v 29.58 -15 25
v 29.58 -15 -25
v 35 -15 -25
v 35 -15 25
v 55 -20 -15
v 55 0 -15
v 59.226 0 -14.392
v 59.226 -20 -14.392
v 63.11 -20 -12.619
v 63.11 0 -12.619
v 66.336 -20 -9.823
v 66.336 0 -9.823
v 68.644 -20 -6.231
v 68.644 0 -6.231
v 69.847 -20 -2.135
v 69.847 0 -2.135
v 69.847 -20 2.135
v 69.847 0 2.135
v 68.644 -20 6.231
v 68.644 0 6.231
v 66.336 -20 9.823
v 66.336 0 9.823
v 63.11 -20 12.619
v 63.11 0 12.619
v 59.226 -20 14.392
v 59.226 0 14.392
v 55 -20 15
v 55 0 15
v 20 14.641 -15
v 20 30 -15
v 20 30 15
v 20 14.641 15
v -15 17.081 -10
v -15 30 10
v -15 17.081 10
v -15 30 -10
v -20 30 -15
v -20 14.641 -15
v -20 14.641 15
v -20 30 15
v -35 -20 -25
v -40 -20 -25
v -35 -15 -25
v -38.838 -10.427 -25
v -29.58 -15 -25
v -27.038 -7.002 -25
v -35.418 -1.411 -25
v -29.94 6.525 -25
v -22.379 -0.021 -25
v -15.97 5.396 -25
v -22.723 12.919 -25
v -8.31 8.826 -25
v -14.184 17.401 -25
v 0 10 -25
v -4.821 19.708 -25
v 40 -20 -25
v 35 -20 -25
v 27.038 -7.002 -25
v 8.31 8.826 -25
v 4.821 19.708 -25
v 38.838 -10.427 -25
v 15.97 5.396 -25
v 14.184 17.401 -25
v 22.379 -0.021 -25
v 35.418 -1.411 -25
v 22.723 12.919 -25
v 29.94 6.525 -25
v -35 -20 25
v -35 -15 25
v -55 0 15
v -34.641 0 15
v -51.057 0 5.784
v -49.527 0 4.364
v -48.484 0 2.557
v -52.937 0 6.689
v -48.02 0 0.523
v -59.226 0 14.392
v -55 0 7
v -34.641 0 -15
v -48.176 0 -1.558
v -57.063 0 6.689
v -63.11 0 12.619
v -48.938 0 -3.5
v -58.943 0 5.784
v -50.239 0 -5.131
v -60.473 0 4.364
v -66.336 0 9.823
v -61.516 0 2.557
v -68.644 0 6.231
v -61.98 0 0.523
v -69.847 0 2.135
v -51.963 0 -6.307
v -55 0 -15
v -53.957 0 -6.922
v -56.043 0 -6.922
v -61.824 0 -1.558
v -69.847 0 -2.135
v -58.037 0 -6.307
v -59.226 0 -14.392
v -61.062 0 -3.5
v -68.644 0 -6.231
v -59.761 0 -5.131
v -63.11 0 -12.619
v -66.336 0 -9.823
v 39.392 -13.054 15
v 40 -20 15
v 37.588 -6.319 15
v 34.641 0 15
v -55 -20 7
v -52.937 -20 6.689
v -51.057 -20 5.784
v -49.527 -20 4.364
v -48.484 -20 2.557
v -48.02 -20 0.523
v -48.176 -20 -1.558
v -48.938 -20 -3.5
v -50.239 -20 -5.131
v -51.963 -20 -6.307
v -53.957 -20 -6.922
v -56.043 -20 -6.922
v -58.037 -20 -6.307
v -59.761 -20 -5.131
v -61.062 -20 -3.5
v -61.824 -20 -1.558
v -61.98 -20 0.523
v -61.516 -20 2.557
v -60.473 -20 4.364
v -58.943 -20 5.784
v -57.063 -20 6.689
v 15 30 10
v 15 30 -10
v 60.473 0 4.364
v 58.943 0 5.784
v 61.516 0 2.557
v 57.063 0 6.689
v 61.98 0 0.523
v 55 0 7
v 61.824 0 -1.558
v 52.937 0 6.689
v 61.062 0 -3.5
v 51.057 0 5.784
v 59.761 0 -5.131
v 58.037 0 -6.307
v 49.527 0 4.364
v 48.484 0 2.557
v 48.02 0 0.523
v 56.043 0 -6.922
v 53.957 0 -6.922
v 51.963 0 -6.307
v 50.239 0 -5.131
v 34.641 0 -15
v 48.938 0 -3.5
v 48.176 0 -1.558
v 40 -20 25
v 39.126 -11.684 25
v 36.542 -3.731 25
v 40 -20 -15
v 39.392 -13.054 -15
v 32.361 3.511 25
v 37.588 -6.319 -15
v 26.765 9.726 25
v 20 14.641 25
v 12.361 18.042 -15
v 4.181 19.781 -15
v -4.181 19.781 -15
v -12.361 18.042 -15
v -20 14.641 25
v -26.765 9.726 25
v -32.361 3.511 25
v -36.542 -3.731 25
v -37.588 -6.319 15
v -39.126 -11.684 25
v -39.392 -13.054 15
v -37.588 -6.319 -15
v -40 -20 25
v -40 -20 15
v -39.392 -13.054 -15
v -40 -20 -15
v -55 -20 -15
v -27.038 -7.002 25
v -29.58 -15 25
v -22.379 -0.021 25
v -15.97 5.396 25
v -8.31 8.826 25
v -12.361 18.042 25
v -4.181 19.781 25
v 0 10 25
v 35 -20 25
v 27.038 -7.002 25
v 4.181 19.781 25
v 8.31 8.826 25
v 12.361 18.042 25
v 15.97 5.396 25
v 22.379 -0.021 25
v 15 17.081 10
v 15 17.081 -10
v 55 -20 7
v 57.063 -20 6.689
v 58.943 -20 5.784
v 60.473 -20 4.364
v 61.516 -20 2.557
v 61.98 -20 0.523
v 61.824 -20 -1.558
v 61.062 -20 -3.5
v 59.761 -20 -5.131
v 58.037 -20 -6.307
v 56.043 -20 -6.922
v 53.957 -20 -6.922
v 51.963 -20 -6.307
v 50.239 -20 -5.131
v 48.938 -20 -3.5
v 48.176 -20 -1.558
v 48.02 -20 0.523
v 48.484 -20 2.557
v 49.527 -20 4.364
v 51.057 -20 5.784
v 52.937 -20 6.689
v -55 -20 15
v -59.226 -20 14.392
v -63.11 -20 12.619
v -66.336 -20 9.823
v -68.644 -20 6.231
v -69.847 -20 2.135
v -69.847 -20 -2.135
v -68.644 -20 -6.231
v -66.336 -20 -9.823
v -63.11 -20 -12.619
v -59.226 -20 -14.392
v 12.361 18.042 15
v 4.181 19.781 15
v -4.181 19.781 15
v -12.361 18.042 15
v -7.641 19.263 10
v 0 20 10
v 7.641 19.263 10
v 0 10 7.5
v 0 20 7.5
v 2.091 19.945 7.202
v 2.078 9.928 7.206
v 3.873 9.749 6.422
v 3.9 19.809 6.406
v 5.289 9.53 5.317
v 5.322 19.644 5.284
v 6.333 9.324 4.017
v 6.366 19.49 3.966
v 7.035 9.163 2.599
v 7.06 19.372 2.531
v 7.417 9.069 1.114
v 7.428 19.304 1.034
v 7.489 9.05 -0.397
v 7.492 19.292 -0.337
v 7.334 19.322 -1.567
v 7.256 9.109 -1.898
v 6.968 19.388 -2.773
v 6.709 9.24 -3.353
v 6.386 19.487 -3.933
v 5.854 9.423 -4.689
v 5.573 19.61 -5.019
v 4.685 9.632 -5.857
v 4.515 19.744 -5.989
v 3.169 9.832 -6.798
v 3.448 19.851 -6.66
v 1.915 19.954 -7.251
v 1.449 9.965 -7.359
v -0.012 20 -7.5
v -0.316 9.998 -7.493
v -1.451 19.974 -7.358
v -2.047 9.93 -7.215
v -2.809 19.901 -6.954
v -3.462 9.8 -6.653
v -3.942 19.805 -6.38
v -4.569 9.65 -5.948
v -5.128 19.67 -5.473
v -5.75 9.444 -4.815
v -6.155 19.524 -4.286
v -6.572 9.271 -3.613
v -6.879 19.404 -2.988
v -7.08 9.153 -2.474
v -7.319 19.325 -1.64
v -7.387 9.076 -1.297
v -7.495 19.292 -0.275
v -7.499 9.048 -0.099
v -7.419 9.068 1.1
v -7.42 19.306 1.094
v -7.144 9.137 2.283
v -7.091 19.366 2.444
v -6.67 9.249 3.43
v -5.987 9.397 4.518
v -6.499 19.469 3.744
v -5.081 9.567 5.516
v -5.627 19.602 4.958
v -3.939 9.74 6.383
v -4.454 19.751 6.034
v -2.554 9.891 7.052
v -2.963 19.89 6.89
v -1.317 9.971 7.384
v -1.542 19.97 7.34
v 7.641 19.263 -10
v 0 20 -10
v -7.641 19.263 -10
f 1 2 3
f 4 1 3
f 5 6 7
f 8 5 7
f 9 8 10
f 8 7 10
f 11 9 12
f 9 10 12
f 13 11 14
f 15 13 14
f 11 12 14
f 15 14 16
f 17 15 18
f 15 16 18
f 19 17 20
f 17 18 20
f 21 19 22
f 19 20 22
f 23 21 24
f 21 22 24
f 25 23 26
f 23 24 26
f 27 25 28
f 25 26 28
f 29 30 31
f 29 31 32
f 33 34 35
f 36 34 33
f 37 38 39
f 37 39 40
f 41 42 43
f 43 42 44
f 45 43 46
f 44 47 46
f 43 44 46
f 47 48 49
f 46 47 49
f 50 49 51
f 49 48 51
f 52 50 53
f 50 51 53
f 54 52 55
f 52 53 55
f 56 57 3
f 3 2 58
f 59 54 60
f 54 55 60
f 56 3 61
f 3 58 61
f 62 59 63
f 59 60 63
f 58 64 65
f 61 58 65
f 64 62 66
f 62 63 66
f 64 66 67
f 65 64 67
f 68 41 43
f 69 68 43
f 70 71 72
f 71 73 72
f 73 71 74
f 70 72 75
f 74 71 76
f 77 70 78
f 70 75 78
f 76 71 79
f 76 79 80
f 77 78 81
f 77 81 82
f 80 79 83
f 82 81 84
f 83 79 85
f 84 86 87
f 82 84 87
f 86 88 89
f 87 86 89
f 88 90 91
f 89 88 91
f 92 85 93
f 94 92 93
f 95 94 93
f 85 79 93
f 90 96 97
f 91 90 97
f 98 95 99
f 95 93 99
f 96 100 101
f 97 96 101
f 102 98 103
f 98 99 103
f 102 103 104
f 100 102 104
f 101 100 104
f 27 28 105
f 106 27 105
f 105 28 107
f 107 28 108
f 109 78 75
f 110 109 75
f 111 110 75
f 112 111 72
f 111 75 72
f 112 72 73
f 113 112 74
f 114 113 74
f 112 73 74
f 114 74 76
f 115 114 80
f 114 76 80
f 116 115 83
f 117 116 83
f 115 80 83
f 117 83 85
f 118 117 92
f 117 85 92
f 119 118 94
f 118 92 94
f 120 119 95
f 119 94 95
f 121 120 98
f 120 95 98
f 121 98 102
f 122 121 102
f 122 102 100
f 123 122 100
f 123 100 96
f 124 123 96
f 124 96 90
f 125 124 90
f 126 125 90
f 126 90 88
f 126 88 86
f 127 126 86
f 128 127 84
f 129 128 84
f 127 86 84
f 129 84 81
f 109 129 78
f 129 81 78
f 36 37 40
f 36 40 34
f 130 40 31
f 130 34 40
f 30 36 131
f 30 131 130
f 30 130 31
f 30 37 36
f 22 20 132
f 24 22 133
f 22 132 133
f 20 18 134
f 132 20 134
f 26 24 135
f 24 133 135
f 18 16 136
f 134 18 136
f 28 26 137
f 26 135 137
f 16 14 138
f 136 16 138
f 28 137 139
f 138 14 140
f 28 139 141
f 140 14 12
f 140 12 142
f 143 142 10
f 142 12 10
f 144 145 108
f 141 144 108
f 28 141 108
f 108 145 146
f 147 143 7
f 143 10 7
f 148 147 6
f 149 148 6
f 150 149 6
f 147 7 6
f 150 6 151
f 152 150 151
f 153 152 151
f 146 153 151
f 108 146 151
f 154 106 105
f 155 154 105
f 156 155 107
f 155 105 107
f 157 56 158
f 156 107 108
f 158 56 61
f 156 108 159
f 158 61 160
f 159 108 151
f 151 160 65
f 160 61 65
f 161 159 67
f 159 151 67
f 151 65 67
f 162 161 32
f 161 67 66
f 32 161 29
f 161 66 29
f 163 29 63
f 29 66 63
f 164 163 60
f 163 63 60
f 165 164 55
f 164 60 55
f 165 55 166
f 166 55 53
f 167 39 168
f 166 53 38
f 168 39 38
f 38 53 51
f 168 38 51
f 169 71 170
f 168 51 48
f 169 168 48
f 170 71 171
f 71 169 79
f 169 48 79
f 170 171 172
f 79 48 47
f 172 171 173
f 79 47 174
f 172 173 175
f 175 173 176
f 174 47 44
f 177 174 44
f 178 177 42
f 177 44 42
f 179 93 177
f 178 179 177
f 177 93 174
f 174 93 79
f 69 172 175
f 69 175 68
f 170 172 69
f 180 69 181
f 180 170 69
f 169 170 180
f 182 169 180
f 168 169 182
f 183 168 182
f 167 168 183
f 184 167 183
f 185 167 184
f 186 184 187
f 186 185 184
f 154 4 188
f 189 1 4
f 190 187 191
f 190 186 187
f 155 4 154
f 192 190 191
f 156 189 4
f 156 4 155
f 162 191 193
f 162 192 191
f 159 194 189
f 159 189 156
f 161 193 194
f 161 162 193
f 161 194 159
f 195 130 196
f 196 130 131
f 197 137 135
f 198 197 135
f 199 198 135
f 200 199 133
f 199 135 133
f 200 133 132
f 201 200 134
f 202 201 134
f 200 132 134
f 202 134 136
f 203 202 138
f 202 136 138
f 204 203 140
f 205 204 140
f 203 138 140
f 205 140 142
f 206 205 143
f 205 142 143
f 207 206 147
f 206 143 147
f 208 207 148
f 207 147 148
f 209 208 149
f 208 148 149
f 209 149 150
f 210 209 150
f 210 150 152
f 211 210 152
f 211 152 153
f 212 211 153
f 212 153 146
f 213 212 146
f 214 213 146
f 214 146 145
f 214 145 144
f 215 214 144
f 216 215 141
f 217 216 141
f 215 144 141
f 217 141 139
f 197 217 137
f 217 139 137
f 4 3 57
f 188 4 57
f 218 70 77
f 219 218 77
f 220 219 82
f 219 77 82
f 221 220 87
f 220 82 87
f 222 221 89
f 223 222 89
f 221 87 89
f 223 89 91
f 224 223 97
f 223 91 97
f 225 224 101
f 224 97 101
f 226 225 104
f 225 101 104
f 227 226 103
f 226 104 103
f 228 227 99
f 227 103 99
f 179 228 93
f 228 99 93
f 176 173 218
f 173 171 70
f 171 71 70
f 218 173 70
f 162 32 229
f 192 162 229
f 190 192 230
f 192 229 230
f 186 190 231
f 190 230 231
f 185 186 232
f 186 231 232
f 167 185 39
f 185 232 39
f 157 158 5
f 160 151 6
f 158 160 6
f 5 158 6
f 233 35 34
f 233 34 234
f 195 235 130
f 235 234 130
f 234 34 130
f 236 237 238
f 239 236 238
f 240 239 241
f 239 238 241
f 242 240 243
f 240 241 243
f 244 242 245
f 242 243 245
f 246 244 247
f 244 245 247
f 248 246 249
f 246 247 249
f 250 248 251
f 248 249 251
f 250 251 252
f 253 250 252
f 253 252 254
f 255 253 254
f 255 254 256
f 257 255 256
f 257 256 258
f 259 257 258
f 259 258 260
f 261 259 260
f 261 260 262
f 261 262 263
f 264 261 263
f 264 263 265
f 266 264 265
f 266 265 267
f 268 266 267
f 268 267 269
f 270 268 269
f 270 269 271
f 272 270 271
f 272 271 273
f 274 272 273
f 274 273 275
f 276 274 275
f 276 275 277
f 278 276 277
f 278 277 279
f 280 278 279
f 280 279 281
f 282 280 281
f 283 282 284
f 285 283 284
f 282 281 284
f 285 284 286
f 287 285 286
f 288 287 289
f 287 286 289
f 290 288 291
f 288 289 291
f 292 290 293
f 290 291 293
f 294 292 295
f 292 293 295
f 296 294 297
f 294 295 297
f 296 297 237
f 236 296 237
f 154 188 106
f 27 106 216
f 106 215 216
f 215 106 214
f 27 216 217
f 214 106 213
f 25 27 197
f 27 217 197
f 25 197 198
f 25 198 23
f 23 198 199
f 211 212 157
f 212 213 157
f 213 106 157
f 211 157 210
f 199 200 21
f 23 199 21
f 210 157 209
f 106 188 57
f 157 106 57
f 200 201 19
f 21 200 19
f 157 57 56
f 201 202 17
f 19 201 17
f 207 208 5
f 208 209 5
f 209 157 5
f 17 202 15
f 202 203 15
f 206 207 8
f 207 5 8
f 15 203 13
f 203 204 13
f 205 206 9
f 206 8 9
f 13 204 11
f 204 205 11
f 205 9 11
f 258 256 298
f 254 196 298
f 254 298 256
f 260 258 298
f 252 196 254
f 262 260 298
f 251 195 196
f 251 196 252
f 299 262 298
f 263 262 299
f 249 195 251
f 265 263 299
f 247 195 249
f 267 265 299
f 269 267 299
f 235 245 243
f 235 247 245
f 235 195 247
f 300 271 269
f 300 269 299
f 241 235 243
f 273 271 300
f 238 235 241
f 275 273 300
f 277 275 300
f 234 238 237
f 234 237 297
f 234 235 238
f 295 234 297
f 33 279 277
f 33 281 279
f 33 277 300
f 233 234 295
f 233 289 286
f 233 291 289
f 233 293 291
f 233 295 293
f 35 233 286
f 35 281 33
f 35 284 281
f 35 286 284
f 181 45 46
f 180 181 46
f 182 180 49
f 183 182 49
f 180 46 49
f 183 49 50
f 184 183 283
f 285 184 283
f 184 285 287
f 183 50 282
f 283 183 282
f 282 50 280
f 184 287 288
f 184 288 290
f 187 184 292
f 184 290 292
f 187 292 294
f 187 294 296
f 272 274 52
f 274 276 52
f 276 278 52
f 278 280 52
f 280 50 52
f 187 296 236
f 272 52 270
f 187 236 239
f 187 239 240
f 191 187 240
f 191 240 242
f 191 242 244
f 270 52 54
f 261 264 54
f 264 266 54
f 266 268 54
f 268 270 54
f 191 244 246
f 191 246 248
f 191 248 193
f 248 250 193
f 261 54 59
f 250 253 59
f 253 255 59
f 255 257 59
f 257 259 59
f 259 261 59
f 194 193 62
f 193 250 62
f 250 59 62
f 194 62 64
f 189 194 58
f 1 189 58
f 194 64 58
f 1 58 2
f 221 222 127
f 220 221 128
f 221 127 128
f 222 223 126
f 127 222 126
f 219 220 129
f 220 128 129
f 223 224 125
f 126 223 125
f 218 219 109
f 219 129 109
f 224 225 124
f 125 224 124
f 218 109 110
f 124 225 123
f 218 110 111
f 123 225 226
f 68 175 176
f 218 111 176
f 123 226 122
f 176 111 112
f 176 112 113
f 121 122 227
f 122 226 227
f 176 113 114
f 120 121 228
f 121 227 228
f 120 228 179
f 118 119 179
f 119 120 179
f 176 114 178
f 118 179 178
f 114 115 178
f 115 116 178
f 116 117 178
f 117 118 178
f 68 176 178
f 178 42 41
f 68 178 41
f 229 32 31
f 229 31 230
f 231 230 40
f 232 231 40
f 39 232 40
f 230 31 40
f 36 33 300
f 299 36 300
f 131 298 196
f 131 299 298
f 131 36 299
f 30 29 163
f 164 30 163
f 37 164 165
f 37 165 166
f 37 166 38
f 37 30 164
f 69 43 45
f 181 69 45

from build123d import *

# Parameters (mm, degrees)
SKETCH1_R                = 7
BOSS_EXTRUDE1_DEPTH      = 20
BOSS_EXTRUDE2_DEPTH      = 10
BOSS_EXTRUDE2_DEPTH_BACK = 40
CUT_EXTRUDE1_START       = -72
CUT_EXTRUDE1_DEPTH       = 72
BOSS_EXTRUDE5_START      = -40
BOSS_EXTRUDE5_DEPTH      = 40
CUT_EXTRUDE3_START       = -10
CUT_EXTRUDE3_DEPTH       = 10
CUT_EXTRUDE5_REACH       = 91.582
CUT_EXTRUDE5_END_RADIUS  = 40
SKETCH11_W               = 30
SKETCH11_H               = 20
SKETCH12_R               = 7.5
CUT_EXTRUDE6_DEPTH       = 70


with BuildPart() as part:
    # Sketch1 → Boss-Extrude1 (new body)
    with BuildSketch(Plane(origin=(0, 0, 0), x_dir=(1, 0, 0), z_dir=(0, 1, 0))):
        with BuildLine():
            Line((-55, 15), (55, 15))
            ThreePointArc((55, 15), (70, 0), (55, -15))
            Line((55, -15), (-55, -15))
            ThreePointArc((-55, -15), (-70, 0), (-55, 15))
        make_face()
        with Locations(Location((-55, 0, 0), (0, 0, 270))):
            Circle(SKETCH1_R, mode=Mode.SUBTRACT)
        with Locations(Location((55, 0, 0), (0, 0, 270))):
            Circle(SKETCH1_R, mode=Mode.SUBTRACT)
    extrude(amount=-BOSS_EXTRUDE1_DEPTH)

    # Sketch2 → Boss-Extrude2 (add, two sides: drawn at the far end of the back side and taken through both)
    with BuildSketch(Plane.XY.offset(15).offset(-BOSS_EXTRUDE2_DEPTH_BACK)):
        with BuildLine():
            Line((-40, -20), (-35, -20))
            Line((-35, -20), (-35, -15))
            Line((-35, -15), (-29.580398915, -15))
            ThreePointArc((-29.580398915, -15), (0, 10), (29.580398915, -15))
            Line((29.580398915, -15), (35, -15))
            Line((35, -15), (35, -20))
            Line((35, -20), (40, -20))
            ThreePointArc((40, -20), (0, 20), (-40, -20))
        make_face()
    extrude(amount=BOSS_EXTRUDE2_DEPTH + BOSS_EXTRUDE2_DEPTH_BACK)

    # Sketch3 → Cut-Extrude1 (cut)
    with BuildSketch(Plane.XY.offset(15).offset(CUT_EXTRUDE1_START)):
        with BuildLine():
            Line((-35, -20), (-35, -15))
            Line((-35, -15), (-29.580398915, -15))
            ThreePointArc((-29.580398915, -15), (0, 10), (29.580398915, -15))
            Line((29.580398915, -15), (35, -15))
            Line((35, -15), (35, -20))
            Line((35, -20), (-35, -20))
        make_face()
    extrude(amount=CUT_EXTRUDE1_DEPTH, mode=Mode.SUBTRACT)

    # Sketch7 → Boss-Extrude5 (add)
    with BuildSketch(Plane.XY.offset(25).offset(BOSS_EXTRUDE5_START)):
        with BuildLine():
            Line((-20, 30), (20, 30))
            Line((20, 30), (20, 14.641016151))
            ThreePointArc((20, 14.641016151), (0, 20), (-20, 14.641016151))
            Line((-20, 14.641016151), (-20, 30))
        make_face()
    extrude(amount=BOSS_EXTRUDE5_DEPTH)

    # Sketch10 → Cut-Extrude3 (cut)
    with BuildSketch(Plane.XY.offset(25).offset(CUT_EXTRUDE3_START)):
        with BuildLine():
            Line((-20, 14.641016151), (-20, 30))
            Line((-20, 30), (20, 30))
            Line((20, 30), (20, 14.641016151))
            ThreePointArc((20, 14.641016151), (0, 20), (-20, 14.641016151))
        make_face()
    extrude(amount=CUT_EXTRUDE3_DEPTH, mode=Mode.SUBTRACT)

    # Cut-Extrude5: up to this cylinder (the profile starts outside it)
    cut_extrude5_end = Plane(origin=(0, -20, 0), z_dir=(0, 0, 1)) * Cylinder(CUT_EXTRUDE5_END_RADIUS, 264.164, mode=Mode.PRIVATE)
    # Sketch11 → Cut-Extrude5 (cut, up to the surface)
    with BuildSketch(Plane(origin=(0, 30, 0), x_dir=(1, 0, 0), z_dir=(0, 1, 0)), mode=Mode.PRIVATE) as cut_extrude5_sk1:
        Rectangle(SKETCH11_W, SKETCH11_H)
    cut_extrude5_tool1 = extrude(cut_extrude5_sk1.sketch, amount=-CUT_EXTRUDE5_REACH, mode=Mode.PRIVATE) - cut_extrude5_end
    add(cut_extrude5_tool1.solids().sort_by_distance((0, 30, 0))[0], mode=Mode.SUBTRACT)

    # Sketch12 → Cut-Extrude6 (cut)
    with BuildSketch(Plane(origin=(0, 30, 0), x_dir=(1, 0, 0), z_dir=(0, 1, 0))):
        with Locations(Location((0, 0, 0), (0, 0, 270))):
            Circle(SKETCH12_R)
    extrude(amount=-CUT_EXTRUDE6_DEPTH, mode=Mode.SUBTRACT)


solid = part.part
